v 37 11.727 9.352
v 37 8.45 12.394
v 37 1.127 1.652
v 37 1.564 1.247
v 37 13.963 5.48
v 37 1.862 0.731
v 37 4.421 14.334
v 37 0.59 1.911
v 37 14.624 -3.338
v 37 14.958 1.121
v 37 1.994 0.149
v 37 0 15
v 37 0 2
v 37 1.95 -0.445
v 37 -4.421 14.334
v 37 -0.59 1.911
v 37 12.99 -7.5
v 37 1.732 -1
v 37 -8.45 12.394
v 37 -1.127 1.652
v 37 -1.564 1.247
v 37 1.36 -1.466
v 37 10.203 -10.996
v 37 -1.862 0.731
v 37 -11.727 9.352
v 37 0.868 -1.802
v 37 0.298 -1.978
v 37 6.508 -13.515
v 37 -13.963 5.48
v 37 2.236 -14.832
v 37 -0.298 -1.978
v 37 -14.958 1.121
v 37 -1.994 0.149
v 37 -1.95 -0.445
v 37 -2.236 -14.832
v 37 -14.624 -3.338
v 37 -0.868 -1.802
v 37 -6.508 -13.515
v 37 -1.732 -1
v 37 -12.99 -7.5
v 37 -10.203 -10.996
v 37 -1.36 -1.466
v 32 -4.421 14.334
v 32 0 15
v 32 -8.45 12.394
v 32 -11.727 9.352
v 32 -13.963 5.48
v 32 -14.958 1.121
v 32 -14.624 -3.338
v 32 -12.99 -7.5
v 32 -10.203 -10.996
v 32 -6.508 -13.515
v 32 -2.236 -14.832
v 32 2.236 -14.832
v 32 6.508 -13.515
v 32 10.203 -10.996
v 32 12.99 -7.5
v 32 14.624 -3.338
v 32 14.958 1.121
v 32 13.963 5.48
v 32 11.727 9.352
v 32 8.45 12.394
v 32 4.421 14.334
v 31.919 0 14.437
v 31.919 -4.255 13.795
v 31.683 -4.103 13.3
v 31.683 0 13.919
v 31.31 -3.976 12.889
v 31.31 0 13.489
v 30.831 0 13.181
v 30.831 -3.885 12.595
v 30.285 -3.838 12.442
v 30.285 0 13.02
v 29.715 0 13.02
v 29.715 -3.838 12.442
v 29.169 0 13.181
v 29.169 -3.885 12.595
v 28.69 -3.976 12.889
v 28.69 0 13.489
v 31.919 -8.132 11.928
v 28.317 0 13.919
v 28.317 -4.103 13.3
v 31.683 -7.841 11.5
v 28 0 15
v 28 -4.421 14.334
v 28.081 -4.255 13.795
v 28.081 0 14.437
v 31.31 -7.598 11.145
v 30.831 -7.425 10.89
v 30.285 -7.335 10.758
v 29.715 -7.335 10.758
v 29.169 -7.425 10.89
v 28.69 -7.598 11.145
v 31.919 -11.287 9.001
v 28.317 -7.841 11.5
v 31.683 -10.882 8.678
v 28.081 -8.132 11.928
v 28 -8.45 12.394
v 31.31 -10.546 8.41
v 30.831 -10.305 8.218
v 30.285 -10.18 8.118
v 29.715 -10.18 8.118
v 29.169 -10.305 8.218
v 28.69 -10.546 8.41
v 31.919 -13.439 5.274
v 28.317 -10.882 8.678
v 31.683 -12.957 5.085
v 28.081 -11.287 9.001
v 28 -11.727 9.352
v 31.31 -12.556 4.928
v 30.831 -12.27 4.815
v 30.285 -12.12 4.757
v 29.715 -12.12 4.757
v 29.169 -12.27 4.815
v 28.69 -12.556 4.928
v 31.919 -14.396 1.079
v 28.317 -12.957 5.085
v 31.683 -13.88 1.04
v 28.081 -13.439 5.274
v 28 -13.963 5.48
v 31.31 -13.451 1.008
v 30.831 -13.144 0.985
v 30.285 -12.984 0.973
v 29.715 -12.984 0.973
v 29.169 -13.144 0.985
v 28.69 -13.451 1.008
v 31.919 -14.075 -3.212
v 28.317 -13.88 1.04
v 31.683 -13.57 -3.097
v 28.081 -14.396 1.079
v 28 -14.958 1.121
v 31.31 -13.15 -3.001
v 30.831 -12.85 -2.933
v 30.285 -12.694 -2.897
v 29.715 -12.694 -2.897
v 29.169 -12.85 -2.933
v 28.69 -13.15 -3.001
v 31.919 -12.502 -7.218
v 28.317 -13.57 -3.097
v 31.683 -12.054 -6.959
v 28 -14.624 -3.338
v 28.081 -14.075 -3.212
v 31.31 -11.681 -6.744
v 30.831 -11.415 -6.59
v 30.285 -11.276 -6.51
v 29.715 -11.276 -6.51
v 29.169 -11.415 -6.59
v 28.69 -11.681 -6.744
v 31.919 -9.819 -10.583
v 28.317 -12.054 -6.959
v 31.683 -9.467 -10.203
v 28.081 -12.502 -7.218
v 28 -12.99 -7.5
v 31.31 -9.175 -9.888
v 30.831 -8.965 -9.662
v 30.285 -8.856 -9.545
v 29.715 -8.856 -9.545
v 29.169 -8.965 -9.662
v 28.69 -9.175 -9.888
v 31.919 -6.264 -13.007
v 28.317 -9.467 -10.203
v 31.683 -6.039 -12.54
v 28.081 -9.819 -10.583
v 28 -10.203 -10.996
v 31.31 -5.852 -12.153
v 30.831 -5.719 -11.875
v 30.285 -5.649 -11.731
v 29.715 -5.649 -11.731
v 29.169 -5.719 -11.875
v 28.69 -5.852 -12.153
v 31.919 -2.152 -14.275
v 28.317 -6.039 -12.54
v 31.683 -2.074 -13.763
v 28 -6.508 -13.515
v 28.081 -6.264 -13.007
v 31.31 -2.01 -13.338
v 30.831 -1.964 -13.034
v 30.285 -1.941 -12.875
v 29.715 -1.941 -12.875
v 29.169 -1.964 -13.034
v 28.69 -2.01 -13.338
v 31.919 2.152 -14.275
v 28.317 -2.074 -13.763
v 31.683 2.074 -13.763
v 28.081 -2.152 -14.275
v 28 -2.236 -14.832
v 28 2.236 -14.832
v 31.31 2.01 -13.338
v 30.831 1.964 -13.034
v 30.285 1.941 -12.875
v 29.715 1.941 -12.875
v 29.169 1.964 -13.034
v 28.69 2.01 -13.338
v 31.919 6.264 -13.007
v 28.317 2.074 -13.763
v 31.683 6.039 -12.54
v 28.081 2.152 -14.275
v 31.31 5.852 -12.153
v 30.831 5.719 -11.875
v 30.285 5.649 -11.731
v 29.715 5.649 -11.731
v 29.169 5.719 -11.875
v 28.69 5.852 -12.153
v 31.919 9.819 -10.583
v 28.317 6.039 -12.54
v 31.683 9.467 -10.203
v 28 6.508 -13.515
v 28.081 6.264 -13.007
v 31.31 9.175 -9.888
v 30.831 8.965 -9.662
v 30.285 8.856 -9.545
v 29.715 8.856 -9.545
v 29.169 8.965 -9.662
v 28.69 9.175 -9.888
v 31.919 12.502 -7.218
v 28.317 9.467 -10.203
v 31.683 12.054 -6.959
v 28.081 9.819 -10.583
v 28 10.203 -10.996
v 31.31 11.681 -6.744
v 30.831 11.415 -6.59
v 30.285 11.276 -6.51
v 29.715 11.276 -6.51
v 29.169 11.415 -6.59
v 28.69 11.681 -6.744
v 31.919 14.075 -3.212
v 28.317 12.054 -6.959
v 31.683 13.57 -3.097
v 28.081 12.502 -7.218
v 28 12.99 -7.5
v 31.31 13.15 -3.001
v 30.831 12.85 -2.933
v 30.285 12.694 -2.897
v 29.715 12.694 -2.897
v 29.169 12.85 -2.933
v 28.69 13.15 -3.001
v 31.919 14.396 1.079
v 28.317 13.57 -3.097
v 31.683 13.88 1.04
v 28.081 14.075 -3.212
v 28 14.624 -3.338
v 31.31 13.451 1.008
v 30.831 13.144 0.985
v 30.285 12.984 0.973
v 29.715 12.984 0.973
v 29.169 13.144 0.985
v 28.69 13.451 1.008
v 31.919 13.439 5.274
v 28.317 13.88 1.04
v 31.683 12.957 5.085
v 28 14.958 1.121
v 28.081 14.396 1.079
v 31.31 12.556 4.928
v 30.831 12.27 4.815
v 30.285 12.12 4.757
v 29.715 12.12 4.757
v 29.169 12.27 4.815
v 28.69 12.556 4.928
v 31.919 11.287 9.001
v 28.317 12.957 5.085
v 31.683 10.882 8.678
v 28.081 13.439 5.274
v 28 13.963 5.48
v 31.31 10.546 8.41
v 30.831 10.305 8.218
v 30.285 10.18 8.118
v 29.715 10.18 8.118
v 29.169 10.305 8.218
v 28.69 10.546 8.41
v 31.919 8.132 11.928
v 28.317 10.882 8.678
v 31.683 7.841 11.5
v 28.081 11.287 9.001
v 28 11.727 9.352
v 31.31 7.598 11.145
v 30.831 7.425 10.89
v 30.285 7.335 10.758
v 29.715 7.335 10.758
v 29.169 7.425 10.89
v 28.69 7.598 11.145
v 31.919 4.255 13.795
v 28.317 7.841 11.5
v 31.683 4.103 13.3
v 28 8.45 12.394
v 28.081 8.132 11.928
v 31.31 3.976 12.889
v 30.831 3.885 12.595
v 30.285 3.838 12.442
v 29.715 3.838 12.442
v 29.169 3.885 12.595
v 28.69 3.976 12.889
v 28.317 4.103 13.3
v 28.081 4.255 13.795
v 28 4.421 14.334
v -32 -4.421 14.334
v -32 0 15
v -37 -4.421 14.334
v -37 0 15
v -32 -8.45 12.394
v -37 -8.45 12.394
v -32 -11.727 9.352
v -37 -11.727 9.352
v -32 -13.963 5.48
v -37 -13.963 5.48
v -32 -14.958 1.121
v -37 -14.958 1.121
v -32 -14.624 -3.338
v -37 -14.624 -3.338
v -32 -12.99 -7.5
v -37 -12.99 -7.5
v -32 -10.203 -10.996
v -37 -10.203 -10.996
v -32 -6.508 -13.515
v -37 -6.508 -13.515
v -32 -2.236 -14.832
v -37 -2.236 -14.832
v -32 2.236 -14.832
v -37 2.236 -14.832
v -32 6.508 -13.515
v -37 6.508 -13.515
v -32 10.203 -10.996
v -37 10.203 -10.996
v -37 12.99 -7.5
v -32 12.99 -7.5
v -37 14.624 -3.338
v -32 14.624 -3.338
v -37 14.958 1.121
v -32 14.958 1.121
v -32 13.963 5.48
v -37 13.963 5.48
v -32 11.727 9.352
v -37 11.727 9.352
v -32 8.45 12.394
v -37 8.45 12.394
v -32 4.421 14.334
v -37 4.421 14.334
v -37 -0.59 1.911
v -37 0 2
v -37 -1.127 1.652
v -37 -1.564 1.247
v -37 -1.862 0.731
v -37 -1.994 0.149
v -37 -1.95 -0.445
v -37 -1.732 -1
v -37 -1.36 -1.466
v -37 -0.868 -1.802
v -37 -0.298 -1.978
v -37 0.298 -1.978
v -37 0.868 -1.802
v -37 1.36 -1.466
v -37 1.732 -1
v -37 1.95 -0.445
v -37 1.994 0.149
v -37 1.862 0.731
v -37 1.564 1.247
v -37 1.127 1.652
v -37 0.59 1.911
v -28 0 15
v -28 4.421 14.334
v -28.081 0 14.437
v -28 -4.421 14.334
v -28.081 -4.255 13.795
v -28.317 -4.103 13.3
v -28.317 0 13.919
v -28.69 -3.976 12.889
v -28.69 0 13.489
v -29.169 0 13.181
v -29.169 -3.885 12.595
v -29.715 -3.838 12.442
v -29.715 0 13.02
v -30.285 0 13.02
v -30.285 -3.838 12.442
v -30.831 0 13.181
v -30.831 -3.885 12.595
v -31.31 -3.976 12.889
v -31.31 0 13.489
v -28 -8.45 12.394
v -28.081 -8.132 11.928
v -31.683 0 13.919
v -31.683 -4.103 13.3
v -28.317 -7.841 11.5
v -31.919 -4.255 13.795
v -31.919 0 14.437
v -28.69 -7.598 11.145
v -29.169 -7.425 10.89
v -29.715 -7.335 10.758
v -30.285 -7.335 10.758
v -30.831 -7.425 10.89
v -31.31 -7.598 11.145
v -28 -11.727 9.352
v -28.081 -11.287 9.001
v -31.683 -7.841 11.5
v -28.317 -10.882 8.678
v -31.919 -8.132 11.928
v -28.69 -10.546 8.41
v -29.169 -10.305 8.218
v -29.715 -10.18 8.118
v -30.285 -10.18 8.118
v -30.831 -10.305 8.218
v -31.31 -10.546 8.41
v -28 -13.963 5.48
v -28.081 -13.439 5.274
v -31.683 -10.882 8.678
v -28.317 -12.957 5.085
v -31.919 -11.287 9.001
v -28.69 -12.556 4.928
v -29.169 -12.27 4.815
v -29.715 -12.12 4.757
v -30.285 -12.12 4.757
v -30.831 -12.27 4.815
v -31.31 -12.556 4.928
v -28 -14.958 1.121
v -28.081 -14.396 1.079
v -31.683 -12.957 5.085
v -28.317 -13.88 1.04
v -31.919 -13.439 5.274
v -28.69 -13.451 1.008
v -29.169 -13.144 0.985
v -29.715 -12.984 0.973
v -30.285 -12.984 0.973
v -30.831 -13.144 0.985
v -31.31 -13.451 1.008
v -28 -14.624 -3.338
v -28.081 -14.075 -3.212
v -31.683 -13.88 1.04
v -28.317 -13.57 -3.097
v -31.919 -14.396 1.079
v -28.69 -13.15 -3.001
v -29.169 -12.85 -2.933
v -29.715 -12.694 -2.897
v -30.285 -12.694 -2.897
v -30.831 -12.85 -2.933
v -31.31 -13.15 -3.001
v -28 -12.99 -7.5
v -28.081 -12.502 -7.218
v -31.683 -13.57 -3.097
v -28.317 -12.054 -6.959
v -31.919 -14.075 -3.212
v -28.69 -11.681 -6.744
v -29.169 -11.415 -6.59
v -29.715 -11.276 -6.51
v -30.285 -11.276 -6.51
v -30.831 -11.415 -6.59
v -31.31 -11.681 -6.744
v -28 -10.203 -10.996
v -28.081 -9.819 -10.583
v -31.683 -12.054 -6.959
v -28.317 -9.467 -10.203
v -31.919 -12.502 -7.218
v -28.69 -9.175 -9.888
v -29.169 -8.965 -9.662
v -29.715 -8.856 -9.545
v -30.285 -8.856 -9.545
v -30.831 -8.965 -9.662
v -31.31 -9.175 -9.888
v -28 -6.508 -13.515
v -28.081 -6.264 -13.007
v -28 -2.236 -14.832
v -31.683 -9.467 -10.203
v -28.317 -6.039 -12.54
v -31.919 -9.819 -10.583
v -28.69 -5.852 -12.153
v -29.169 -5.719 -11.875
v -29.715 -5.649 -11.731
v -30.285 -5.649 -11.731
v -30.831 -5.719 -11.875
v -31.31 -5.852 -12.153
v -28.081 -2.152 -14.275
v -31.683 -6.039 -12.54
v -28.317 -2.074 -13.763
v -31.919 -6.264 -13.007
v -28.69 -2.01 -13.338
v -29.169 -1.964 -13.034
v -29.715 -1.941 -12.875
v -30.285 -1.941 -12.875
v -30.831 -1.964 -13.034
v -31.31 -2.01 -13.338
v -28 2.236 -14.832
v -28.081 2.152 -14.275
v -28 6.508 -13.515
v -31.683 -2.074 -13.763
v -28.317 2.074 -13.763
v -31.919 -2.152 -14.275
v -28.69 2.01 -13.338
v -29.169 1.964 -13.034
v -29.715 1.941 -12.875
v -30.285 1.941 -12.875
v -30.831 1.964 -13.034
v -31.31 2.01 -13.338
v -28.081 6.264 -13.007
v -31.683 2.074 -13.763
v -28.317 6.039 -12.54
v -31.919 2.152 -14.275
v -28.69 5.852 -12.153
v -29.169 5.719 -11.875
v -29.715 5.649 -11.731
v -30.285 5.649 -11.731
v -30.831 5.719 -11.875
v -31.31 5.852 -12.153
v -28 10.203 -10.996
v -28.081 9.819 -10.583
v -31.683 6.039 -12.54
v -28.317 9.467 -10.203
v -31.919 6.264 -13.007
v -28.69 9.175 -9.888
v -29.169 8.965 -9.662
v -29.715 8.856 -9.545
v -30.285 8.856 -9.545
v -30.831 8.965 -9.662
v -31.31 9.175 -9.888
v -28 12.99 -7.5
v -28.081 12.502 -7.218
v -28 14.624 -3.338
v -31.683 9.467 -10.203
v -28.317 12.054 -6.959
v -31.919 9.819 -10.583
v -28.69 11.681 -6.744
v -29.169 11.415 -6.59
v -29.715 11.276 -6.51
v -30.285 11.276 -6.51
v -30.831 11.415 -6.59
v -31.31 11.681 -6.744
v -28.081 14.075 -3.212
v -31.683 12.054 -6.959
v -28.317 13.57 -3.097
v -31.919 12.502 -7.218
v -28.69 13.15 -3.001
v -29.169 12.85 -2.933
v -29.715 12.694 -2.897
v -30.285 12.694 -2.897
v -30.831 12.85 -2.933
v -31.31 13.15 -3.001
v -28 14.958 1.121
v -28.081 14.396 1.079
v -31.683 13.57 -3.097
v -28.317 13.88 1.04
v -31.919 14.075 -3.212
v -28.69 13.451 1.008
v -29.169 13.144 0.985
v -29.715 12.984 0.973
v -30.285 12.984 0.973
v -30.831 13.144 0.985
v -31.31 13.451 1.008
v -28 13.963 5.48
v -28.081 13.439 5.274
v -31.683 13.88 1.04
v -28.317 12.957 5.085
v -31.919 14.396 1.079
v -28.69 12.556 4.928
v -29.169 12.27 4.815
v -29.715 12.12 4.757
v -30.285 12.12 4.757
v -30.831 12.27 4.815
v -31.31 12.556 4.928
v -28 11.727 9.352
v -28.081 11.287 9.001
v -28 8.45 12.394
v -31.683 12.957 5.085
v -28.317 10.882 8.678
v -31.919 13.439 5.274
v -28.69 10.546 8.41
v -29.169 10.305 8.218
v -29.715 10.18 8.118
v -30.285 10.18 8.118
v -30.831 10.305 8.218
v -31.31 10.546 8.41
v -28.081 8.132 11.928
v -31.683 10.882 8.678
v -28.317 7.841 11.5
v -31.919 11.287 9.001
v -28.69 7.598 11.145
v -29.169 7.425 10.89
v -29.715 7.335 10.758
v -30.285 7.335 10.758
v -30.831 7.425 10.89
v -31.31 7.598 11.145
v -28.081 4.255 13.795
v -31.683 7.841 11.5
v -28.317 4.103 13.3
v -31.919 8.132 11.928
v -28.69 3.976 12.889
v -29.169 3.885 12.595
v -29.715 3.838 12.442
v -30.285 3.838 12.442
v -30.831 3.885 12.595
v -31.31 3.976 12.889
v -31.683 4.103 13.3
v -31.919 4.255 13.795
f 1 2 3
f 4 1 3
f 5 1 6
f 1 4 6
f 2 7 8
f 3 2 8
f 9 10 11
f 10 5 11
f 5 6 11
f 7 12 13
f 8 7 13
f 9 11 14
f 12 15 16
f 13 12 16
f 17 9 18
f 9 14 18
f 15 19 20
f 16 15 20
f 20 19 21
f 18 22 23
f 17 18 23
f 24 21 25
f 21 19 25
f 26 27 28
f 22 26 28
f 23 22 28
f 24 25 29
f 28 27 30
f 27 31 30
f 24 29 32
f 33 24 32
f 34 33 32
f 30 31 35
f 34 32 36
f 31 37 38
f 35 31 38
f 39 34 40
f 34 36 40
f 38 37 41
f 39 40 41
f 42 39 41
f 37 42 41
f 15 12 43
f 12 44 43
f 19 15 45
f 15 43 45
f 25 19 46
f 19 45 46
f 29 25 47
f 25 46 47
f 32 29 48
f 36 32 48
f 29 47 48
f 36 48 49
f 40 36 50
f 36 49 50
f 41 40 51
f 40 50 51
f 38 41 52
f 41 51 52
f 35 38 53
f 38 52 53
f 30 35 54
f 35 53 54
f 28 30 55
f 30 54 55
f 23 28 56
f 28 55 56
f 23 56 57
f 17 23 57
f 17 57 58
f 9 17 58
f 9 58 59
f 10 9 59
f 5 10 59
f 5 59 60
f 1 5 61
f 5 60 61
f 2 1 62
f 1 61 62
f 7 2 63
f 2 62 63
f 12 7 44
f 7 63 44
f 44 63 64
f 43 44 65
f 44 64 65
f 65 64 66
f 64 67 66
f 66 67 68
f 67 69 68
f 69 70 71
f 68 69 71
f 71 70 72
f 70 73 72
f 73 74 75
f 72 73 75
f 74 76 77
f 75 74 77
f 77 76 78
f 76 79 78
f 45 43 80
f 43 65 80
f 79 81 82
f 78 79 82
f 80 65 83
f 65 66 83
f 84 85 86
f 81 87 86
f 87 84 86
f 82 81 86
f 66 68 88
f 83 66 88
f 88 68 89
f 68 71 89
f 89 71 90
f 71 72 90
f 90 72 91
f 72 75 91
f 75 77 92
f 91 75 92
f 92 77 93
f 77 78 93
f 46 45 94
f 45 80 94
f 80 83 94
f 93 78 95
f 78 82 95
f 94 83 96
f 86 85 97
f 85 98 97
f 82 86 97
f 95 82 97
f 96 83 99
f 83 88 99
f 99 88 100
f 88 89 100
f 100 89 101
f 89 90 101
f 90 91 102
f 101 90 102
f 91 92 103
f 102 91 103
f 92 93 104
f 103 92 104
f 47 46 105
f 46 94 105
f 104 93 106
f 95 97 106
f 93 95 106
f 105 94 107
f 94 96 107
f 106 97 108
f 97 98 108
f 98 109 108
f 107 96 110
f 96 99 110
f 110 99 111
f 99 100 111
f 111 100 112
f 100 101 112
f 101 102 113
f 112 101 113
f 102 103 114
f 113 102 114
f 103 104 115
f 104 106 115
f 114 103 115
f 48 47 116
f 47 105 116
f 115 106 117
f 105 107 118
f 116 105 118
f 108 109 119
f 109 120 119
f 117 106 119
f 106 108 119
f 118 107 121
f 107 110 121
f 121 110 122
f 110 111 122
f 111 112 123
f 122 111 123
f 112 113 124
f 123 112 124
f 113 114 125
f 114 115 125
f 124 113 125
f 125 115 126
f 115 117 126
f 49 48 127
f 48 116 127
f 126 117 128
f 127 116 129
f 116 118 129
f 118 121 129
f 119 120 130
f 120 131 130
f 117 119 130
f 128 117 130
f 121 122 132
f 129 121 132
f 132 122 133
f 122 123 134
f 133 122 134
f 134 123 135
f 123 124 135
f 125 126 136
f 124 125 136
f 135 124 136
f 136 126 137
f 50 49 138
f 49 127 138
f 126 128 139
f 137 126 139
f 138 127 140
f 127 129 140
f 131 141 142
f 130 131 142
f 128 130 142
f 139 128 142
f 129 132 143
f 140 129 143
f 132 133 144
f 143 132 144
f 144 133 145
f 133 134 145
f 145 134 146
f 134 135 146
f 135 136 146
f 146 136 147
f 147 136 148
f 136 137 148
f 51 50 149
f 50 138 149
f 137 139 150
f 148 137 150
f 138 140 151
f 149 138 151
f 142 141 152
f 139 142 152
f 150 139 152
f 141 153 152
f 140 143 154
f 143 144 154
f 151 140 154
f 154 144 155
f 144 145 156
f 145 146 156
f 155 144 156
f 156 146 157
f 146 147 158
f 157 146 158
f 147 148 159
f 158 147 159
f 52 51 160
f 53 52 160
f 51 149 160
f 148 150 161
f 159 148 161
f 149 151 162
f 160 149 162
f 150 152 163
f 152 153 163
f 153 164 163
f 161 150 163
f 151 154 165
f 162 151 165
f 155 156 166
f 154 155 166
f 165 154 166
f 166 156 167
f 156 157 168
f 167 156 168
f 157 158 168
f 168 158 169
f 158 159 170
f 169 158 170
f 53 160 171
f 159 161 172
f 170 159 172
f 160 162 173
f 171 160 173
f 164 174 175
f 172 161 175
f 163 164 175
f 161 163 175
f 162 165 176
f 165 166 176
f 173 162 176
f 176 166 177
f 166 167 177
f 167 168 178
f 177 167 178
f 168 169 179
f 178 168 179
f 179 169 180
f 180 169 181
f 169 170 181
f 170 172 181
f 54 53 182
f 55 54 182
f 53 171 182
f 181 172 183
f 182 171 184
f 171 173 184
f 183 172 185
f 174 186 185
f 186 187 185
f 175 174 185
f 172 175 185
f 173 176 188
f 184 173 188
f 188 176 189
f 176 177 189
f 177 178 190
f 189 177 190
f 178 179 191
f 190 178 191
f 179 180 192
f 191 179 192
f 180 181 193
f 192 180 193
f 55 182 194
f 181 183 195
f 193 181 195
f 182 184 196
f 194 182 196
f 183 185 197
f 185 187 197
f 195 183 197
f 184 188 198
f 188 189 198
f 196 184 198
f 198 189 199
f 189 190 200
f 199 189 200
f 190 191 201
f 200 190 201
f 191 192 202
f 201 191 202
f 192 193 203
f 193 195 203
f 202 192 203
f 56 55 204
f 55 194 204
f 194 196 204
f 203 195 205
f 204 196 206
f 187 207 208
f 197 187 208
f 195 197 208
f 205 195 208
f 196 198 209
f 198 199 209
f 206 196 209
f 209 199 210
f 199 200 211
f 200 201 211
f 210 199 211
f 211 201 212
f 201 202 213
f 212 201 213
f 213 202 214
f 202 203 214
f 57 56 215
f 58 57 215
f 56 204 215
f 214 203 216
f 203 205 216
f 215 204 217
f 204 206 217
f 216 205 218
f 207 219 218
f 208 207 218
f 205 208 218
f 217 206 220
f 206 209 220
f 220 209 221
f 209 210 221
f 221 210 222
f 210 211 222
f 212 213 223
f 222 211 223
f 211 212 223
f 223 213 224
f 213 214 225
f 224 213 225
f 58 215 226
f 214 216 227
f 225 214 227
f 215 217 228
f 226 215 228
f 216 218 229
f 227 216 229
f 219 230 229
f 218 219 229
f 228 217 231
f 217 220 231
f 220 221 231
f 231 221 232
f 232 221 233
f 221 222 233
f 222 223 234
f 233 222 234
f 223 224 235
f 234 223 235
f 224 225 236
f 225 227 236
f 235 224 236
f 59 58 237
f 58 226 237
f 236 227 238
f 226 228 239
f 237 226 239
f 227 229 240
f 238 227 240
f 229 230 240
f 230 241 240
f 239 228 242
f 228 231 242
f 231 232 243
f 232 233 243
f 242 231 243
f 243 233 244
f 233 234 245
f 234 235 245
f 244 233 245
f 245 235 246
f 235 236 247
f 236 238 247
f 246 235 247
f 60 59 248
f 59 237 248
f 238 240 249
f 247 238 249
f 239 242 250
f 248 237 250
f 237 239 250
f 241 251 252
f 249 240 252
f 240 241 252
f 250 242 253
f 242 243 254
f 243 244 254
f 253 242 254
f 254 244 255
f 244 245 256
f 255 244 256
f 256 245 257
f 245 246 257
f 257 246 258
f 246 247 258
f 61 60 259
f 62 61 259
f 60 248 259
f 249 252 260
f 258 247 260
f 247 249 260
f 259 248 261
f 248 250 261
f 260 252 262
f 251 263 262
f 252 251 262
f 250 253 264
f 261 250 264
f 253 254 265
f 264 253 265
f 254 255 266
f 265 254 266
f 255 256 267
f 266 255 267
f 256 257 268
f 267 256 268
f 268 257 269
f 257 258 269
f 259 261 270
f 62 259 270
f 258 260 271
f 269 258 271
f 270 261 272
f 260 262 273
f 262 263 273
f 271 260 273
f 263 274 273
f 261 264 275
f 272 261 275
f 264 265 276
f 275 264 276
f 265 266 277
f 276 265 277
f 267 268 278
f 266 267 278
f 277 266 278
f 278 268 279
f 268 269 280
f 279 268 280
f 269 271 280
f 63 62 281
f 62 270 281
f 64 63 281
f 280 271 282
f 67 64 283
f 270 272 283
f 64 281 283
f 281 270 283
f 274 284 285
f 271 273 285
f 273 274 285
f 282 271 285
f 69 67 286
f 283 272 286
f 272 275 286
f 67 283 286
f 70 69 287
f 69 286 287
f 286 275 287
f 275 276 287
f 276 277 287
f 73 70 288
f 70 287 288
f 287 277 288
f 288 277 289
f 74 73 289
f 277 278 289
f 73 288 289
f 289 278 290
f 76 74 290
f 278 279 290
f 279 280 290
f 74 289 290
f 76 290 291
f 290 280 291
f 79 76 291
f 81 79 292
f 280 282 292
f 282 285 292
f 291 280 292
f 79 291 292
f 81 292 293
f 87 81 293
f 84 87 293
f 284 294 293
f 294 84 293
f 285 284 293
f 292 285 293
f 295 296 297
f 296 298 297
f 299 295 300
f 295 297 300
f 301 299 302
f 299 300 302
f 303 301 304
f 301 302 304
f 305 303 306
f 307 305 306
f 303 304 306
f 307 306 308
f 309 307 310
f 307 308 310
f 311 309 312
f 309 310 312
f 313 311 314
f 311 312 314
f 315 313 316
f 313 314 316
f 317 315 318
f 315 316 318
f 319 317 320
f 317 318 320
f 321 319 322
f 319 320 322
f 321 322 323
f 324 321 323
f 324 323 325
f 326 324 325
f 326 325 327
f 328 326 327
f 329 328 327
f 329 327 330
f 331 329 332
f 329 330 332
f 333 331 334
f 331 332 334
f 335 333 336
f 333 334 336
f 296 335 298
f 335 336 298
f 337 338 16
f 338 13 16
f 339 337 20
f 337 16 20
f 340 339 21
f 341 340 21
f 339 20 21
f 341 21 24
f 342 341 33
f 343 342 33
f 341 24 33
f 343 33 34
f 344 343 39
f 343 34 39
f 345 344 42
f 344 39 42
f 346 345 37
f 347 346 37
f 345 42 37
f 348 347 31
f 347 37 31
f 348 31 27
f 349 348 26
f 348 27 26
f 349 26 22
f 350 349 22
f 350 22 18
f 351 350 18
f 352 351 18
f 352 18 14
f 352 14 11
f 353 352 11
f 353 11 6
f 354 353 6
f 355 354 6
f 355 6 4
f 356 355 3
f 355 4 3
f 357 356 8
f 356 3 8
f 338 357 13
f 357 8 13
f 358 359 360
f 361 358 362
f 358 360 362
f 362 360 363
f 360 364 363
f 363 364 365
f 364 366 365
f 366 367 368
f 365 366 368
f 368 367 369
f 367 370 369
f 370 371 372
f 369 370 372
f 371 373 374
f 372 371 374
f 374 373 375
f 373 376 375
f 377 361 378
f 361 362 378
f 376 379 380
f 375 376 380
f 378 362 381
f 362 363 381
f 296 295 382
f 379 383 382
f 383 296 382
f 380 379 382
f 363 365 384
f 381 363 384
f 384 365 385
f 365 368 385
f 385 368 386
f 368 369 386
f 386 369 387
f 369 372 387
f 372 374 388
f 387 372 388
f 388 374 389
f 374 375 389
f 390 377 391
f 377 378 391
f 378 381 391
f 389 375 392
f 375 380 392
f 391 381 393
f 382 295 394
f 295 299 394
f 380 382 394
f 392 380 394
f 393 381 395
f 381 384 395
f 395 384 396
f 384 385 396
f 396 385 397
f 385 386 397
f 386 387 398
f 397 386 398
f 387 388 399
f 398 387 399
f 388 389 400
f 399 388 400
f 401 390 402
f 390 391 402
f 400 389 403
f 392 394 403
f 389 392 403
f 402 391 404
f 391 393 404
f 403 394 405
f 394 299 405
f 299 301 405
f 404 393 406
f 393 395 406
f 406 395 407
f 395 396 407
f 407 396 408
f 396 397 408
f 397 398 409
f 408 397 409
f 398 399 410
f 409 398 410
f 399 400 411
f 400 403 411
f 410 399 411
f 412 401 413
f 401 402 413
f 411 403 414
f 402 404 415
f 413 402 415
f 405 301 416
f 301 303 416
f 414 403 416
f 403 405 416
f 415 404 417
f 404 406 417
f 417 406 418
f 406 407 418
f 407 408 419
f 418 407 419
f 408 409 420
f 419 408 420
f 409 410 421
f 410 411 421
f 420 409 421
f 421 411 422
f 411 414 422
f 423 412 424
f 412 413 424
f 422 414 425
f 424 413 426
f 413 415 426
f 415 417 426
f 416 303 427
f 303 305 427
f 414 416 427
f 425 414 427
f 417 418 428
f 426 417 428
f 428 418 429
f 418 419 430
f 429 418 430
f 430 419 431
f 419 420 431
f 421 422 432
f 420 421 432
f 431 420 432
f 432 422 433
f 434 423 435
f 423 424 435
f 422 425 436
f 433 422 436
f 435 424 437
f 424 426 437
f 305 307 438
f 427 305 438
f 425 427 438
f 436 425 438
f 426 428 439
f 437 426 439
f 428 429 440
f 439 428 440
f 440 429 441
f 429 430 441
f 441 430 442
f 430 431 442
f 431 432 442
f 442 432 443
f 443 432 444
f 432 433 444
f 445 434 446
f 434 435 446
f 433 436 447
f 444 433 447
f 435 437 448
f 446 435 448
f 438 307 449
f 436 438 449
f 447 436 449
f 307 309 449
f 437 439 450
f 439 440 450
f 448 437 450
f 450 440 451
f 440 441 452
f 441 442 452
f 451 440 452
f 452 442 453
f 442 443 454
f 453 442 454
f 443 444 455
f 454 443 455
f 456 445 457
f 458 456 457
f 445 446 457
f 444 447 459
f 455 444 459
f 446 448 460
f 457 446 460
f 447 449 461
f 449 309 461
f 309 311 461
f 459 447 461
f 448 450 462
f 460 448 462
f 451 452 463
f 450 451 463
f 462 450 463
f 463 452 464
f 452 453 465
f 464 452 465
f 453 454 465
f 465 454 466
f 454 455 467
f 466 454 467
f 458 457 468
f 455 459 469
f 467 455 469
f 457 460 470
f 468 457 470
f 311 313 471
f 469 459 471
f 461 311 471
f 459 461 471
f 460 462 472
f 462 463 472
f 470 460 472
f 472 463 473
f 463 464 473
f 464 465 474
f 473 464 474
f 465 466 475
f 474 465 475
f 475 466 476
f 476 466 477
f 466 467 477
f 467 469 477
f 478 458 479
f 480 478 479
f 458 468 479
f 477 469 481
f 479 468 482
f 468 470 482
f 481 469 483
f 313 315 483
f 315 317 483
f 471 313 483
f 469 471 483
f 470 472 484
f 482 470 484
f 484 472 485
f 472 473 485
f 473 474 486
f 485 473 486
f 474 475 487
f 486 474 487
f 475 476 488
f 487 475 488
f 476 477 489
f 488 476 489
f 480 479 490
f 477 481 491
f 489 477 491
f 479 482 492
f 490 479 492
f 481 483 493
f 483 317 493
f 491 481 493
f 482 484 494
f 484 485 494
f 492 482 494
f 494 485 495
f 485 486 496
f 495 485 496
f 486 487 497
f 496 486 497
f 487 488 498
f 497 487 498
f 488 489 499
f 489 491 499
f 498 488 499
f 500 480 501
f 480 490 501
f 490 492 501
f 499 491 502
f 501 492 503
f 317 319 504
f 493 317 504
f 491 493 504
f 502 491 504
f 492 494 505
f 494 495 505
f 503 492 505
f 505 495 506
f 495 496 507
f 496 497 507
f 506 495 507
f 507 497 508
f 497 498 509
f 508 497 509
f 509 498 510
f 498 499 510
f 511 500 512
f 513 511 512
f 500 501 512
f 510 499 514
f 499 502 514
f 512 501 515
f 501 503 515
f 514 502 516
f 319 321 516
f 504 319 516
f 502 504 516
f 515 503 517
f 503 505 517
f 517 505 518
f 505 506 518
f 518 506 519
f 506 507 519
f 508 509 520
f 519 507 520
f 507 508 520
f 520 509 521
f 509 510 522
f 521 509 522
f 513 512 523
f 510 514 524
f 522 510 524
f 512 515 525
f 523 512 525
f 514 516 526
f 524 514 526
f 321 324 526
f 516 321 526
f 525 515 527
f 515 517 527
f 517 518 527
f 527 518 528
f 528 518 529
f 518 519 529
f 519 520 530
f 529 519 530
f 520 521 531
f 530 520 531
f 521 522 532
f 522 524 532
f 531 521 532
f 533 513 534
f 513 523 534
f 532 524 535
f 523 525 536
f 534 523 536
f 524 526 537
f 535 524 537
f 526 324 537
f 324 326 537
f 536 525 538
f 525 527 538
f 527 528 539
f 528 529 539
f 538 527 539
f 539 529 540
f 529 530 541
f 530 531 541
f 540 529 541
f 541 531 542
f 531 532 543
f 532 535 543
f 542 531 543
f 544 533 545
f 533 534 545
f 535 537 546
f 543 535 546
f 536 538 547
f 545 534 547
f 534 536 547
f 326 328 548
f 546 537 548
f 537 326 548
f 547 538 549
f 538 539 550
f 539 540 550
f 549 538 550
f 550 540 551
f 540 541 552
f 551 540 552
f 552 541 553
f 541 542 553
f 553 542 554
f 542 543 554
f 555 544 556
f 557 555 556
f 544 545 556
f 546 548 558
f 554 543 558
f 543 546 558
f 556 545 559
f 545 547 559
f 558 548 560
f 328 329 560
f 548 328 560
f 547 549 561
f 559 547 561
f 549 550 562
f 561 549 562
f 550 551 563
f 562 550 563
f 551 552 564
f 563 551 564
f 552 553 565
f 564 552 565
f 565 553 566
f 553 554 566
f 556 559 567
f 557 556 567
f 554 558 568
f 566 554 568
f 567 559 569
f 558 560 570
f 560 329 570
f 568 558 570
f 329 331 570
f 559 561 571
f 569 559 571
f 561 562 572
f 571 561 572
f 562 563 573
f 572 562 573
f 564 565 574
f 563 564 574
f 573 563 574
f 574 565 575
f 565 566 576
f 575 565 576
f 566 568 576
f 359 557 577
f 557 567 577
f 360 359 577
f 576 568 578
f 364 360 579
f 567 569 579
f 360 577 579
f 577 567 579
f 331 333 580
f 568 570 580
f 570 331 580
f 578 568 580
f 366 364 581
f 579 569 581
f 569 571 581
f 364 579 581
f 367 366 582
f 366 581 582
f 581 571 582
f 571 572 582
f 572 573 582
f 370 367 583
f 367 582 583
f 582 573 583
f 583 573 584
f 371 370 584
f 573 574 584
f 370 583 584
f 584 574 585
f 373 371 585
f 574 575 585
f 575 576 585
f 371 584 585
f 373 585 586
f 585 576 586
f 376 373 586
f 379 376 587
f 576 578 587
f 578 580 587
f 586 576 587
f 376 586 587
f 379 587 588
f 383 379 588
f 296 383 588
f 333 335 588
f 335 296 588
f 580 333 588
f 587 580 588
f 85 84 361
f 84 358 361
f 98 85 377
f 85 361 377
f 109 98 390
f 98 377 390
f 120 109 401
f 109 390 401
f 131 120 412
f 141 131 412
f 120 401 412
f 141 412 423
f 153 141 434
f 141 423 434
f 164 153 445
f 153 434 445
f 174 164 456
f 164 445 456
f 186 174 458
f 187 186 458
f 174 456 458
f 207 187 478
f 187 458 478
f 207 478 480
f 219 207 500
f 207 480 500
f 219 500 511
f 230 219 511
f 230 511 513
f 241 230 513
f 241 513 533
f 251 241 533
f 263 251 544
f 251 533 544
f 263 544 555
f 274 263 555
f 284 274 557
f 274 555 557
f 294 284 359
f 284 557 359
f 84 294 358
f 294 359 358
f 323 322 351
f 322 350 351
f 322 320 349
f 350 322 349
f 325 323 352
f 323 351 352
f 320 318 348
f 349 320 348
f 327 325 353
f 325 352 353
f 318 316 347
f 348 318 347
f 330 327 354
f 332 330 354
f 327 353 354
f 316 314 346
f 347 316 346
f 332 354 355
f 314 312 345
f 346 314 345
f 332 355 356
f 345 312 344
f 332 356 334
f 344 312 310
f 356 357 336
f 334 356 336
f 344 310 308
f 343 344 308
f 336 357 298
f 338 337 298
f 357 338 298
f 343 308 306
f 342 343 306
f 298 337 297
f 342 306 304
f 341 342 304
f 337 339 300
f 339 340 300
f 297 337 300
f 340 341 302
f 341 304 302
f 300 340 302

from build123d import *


with BuildPart() as part:
    # 草图1 → 旋转2 (revolve)
    with BuildSketch(Plane.XY, mode=Mode.PRIVATE) as revolve_2_sk:
        with BuildLine():
            Line((-32, 15), (-37, 15))
            Line((-37, 15), (-37, 2))
            Line((-37, 2), (37, 2))
            Line((37, 2), (37, 15))
            Line((37, 15), (32, 15))
            ThreePointArc((32, 15), (30, 13), (28, 15))
            Line((28, 15), (-28, 15))
            ThreePointArc((-28, 15), (-30, 13), (-32, 15))
        make_face()
    revolve(revolve_2_sk.sketch.rotate(Axis((0, 0, 0), (1, 0, 0)), 90), axis=Axis((0, 0, 0), (1, 0, 0)))


solid = part.part
